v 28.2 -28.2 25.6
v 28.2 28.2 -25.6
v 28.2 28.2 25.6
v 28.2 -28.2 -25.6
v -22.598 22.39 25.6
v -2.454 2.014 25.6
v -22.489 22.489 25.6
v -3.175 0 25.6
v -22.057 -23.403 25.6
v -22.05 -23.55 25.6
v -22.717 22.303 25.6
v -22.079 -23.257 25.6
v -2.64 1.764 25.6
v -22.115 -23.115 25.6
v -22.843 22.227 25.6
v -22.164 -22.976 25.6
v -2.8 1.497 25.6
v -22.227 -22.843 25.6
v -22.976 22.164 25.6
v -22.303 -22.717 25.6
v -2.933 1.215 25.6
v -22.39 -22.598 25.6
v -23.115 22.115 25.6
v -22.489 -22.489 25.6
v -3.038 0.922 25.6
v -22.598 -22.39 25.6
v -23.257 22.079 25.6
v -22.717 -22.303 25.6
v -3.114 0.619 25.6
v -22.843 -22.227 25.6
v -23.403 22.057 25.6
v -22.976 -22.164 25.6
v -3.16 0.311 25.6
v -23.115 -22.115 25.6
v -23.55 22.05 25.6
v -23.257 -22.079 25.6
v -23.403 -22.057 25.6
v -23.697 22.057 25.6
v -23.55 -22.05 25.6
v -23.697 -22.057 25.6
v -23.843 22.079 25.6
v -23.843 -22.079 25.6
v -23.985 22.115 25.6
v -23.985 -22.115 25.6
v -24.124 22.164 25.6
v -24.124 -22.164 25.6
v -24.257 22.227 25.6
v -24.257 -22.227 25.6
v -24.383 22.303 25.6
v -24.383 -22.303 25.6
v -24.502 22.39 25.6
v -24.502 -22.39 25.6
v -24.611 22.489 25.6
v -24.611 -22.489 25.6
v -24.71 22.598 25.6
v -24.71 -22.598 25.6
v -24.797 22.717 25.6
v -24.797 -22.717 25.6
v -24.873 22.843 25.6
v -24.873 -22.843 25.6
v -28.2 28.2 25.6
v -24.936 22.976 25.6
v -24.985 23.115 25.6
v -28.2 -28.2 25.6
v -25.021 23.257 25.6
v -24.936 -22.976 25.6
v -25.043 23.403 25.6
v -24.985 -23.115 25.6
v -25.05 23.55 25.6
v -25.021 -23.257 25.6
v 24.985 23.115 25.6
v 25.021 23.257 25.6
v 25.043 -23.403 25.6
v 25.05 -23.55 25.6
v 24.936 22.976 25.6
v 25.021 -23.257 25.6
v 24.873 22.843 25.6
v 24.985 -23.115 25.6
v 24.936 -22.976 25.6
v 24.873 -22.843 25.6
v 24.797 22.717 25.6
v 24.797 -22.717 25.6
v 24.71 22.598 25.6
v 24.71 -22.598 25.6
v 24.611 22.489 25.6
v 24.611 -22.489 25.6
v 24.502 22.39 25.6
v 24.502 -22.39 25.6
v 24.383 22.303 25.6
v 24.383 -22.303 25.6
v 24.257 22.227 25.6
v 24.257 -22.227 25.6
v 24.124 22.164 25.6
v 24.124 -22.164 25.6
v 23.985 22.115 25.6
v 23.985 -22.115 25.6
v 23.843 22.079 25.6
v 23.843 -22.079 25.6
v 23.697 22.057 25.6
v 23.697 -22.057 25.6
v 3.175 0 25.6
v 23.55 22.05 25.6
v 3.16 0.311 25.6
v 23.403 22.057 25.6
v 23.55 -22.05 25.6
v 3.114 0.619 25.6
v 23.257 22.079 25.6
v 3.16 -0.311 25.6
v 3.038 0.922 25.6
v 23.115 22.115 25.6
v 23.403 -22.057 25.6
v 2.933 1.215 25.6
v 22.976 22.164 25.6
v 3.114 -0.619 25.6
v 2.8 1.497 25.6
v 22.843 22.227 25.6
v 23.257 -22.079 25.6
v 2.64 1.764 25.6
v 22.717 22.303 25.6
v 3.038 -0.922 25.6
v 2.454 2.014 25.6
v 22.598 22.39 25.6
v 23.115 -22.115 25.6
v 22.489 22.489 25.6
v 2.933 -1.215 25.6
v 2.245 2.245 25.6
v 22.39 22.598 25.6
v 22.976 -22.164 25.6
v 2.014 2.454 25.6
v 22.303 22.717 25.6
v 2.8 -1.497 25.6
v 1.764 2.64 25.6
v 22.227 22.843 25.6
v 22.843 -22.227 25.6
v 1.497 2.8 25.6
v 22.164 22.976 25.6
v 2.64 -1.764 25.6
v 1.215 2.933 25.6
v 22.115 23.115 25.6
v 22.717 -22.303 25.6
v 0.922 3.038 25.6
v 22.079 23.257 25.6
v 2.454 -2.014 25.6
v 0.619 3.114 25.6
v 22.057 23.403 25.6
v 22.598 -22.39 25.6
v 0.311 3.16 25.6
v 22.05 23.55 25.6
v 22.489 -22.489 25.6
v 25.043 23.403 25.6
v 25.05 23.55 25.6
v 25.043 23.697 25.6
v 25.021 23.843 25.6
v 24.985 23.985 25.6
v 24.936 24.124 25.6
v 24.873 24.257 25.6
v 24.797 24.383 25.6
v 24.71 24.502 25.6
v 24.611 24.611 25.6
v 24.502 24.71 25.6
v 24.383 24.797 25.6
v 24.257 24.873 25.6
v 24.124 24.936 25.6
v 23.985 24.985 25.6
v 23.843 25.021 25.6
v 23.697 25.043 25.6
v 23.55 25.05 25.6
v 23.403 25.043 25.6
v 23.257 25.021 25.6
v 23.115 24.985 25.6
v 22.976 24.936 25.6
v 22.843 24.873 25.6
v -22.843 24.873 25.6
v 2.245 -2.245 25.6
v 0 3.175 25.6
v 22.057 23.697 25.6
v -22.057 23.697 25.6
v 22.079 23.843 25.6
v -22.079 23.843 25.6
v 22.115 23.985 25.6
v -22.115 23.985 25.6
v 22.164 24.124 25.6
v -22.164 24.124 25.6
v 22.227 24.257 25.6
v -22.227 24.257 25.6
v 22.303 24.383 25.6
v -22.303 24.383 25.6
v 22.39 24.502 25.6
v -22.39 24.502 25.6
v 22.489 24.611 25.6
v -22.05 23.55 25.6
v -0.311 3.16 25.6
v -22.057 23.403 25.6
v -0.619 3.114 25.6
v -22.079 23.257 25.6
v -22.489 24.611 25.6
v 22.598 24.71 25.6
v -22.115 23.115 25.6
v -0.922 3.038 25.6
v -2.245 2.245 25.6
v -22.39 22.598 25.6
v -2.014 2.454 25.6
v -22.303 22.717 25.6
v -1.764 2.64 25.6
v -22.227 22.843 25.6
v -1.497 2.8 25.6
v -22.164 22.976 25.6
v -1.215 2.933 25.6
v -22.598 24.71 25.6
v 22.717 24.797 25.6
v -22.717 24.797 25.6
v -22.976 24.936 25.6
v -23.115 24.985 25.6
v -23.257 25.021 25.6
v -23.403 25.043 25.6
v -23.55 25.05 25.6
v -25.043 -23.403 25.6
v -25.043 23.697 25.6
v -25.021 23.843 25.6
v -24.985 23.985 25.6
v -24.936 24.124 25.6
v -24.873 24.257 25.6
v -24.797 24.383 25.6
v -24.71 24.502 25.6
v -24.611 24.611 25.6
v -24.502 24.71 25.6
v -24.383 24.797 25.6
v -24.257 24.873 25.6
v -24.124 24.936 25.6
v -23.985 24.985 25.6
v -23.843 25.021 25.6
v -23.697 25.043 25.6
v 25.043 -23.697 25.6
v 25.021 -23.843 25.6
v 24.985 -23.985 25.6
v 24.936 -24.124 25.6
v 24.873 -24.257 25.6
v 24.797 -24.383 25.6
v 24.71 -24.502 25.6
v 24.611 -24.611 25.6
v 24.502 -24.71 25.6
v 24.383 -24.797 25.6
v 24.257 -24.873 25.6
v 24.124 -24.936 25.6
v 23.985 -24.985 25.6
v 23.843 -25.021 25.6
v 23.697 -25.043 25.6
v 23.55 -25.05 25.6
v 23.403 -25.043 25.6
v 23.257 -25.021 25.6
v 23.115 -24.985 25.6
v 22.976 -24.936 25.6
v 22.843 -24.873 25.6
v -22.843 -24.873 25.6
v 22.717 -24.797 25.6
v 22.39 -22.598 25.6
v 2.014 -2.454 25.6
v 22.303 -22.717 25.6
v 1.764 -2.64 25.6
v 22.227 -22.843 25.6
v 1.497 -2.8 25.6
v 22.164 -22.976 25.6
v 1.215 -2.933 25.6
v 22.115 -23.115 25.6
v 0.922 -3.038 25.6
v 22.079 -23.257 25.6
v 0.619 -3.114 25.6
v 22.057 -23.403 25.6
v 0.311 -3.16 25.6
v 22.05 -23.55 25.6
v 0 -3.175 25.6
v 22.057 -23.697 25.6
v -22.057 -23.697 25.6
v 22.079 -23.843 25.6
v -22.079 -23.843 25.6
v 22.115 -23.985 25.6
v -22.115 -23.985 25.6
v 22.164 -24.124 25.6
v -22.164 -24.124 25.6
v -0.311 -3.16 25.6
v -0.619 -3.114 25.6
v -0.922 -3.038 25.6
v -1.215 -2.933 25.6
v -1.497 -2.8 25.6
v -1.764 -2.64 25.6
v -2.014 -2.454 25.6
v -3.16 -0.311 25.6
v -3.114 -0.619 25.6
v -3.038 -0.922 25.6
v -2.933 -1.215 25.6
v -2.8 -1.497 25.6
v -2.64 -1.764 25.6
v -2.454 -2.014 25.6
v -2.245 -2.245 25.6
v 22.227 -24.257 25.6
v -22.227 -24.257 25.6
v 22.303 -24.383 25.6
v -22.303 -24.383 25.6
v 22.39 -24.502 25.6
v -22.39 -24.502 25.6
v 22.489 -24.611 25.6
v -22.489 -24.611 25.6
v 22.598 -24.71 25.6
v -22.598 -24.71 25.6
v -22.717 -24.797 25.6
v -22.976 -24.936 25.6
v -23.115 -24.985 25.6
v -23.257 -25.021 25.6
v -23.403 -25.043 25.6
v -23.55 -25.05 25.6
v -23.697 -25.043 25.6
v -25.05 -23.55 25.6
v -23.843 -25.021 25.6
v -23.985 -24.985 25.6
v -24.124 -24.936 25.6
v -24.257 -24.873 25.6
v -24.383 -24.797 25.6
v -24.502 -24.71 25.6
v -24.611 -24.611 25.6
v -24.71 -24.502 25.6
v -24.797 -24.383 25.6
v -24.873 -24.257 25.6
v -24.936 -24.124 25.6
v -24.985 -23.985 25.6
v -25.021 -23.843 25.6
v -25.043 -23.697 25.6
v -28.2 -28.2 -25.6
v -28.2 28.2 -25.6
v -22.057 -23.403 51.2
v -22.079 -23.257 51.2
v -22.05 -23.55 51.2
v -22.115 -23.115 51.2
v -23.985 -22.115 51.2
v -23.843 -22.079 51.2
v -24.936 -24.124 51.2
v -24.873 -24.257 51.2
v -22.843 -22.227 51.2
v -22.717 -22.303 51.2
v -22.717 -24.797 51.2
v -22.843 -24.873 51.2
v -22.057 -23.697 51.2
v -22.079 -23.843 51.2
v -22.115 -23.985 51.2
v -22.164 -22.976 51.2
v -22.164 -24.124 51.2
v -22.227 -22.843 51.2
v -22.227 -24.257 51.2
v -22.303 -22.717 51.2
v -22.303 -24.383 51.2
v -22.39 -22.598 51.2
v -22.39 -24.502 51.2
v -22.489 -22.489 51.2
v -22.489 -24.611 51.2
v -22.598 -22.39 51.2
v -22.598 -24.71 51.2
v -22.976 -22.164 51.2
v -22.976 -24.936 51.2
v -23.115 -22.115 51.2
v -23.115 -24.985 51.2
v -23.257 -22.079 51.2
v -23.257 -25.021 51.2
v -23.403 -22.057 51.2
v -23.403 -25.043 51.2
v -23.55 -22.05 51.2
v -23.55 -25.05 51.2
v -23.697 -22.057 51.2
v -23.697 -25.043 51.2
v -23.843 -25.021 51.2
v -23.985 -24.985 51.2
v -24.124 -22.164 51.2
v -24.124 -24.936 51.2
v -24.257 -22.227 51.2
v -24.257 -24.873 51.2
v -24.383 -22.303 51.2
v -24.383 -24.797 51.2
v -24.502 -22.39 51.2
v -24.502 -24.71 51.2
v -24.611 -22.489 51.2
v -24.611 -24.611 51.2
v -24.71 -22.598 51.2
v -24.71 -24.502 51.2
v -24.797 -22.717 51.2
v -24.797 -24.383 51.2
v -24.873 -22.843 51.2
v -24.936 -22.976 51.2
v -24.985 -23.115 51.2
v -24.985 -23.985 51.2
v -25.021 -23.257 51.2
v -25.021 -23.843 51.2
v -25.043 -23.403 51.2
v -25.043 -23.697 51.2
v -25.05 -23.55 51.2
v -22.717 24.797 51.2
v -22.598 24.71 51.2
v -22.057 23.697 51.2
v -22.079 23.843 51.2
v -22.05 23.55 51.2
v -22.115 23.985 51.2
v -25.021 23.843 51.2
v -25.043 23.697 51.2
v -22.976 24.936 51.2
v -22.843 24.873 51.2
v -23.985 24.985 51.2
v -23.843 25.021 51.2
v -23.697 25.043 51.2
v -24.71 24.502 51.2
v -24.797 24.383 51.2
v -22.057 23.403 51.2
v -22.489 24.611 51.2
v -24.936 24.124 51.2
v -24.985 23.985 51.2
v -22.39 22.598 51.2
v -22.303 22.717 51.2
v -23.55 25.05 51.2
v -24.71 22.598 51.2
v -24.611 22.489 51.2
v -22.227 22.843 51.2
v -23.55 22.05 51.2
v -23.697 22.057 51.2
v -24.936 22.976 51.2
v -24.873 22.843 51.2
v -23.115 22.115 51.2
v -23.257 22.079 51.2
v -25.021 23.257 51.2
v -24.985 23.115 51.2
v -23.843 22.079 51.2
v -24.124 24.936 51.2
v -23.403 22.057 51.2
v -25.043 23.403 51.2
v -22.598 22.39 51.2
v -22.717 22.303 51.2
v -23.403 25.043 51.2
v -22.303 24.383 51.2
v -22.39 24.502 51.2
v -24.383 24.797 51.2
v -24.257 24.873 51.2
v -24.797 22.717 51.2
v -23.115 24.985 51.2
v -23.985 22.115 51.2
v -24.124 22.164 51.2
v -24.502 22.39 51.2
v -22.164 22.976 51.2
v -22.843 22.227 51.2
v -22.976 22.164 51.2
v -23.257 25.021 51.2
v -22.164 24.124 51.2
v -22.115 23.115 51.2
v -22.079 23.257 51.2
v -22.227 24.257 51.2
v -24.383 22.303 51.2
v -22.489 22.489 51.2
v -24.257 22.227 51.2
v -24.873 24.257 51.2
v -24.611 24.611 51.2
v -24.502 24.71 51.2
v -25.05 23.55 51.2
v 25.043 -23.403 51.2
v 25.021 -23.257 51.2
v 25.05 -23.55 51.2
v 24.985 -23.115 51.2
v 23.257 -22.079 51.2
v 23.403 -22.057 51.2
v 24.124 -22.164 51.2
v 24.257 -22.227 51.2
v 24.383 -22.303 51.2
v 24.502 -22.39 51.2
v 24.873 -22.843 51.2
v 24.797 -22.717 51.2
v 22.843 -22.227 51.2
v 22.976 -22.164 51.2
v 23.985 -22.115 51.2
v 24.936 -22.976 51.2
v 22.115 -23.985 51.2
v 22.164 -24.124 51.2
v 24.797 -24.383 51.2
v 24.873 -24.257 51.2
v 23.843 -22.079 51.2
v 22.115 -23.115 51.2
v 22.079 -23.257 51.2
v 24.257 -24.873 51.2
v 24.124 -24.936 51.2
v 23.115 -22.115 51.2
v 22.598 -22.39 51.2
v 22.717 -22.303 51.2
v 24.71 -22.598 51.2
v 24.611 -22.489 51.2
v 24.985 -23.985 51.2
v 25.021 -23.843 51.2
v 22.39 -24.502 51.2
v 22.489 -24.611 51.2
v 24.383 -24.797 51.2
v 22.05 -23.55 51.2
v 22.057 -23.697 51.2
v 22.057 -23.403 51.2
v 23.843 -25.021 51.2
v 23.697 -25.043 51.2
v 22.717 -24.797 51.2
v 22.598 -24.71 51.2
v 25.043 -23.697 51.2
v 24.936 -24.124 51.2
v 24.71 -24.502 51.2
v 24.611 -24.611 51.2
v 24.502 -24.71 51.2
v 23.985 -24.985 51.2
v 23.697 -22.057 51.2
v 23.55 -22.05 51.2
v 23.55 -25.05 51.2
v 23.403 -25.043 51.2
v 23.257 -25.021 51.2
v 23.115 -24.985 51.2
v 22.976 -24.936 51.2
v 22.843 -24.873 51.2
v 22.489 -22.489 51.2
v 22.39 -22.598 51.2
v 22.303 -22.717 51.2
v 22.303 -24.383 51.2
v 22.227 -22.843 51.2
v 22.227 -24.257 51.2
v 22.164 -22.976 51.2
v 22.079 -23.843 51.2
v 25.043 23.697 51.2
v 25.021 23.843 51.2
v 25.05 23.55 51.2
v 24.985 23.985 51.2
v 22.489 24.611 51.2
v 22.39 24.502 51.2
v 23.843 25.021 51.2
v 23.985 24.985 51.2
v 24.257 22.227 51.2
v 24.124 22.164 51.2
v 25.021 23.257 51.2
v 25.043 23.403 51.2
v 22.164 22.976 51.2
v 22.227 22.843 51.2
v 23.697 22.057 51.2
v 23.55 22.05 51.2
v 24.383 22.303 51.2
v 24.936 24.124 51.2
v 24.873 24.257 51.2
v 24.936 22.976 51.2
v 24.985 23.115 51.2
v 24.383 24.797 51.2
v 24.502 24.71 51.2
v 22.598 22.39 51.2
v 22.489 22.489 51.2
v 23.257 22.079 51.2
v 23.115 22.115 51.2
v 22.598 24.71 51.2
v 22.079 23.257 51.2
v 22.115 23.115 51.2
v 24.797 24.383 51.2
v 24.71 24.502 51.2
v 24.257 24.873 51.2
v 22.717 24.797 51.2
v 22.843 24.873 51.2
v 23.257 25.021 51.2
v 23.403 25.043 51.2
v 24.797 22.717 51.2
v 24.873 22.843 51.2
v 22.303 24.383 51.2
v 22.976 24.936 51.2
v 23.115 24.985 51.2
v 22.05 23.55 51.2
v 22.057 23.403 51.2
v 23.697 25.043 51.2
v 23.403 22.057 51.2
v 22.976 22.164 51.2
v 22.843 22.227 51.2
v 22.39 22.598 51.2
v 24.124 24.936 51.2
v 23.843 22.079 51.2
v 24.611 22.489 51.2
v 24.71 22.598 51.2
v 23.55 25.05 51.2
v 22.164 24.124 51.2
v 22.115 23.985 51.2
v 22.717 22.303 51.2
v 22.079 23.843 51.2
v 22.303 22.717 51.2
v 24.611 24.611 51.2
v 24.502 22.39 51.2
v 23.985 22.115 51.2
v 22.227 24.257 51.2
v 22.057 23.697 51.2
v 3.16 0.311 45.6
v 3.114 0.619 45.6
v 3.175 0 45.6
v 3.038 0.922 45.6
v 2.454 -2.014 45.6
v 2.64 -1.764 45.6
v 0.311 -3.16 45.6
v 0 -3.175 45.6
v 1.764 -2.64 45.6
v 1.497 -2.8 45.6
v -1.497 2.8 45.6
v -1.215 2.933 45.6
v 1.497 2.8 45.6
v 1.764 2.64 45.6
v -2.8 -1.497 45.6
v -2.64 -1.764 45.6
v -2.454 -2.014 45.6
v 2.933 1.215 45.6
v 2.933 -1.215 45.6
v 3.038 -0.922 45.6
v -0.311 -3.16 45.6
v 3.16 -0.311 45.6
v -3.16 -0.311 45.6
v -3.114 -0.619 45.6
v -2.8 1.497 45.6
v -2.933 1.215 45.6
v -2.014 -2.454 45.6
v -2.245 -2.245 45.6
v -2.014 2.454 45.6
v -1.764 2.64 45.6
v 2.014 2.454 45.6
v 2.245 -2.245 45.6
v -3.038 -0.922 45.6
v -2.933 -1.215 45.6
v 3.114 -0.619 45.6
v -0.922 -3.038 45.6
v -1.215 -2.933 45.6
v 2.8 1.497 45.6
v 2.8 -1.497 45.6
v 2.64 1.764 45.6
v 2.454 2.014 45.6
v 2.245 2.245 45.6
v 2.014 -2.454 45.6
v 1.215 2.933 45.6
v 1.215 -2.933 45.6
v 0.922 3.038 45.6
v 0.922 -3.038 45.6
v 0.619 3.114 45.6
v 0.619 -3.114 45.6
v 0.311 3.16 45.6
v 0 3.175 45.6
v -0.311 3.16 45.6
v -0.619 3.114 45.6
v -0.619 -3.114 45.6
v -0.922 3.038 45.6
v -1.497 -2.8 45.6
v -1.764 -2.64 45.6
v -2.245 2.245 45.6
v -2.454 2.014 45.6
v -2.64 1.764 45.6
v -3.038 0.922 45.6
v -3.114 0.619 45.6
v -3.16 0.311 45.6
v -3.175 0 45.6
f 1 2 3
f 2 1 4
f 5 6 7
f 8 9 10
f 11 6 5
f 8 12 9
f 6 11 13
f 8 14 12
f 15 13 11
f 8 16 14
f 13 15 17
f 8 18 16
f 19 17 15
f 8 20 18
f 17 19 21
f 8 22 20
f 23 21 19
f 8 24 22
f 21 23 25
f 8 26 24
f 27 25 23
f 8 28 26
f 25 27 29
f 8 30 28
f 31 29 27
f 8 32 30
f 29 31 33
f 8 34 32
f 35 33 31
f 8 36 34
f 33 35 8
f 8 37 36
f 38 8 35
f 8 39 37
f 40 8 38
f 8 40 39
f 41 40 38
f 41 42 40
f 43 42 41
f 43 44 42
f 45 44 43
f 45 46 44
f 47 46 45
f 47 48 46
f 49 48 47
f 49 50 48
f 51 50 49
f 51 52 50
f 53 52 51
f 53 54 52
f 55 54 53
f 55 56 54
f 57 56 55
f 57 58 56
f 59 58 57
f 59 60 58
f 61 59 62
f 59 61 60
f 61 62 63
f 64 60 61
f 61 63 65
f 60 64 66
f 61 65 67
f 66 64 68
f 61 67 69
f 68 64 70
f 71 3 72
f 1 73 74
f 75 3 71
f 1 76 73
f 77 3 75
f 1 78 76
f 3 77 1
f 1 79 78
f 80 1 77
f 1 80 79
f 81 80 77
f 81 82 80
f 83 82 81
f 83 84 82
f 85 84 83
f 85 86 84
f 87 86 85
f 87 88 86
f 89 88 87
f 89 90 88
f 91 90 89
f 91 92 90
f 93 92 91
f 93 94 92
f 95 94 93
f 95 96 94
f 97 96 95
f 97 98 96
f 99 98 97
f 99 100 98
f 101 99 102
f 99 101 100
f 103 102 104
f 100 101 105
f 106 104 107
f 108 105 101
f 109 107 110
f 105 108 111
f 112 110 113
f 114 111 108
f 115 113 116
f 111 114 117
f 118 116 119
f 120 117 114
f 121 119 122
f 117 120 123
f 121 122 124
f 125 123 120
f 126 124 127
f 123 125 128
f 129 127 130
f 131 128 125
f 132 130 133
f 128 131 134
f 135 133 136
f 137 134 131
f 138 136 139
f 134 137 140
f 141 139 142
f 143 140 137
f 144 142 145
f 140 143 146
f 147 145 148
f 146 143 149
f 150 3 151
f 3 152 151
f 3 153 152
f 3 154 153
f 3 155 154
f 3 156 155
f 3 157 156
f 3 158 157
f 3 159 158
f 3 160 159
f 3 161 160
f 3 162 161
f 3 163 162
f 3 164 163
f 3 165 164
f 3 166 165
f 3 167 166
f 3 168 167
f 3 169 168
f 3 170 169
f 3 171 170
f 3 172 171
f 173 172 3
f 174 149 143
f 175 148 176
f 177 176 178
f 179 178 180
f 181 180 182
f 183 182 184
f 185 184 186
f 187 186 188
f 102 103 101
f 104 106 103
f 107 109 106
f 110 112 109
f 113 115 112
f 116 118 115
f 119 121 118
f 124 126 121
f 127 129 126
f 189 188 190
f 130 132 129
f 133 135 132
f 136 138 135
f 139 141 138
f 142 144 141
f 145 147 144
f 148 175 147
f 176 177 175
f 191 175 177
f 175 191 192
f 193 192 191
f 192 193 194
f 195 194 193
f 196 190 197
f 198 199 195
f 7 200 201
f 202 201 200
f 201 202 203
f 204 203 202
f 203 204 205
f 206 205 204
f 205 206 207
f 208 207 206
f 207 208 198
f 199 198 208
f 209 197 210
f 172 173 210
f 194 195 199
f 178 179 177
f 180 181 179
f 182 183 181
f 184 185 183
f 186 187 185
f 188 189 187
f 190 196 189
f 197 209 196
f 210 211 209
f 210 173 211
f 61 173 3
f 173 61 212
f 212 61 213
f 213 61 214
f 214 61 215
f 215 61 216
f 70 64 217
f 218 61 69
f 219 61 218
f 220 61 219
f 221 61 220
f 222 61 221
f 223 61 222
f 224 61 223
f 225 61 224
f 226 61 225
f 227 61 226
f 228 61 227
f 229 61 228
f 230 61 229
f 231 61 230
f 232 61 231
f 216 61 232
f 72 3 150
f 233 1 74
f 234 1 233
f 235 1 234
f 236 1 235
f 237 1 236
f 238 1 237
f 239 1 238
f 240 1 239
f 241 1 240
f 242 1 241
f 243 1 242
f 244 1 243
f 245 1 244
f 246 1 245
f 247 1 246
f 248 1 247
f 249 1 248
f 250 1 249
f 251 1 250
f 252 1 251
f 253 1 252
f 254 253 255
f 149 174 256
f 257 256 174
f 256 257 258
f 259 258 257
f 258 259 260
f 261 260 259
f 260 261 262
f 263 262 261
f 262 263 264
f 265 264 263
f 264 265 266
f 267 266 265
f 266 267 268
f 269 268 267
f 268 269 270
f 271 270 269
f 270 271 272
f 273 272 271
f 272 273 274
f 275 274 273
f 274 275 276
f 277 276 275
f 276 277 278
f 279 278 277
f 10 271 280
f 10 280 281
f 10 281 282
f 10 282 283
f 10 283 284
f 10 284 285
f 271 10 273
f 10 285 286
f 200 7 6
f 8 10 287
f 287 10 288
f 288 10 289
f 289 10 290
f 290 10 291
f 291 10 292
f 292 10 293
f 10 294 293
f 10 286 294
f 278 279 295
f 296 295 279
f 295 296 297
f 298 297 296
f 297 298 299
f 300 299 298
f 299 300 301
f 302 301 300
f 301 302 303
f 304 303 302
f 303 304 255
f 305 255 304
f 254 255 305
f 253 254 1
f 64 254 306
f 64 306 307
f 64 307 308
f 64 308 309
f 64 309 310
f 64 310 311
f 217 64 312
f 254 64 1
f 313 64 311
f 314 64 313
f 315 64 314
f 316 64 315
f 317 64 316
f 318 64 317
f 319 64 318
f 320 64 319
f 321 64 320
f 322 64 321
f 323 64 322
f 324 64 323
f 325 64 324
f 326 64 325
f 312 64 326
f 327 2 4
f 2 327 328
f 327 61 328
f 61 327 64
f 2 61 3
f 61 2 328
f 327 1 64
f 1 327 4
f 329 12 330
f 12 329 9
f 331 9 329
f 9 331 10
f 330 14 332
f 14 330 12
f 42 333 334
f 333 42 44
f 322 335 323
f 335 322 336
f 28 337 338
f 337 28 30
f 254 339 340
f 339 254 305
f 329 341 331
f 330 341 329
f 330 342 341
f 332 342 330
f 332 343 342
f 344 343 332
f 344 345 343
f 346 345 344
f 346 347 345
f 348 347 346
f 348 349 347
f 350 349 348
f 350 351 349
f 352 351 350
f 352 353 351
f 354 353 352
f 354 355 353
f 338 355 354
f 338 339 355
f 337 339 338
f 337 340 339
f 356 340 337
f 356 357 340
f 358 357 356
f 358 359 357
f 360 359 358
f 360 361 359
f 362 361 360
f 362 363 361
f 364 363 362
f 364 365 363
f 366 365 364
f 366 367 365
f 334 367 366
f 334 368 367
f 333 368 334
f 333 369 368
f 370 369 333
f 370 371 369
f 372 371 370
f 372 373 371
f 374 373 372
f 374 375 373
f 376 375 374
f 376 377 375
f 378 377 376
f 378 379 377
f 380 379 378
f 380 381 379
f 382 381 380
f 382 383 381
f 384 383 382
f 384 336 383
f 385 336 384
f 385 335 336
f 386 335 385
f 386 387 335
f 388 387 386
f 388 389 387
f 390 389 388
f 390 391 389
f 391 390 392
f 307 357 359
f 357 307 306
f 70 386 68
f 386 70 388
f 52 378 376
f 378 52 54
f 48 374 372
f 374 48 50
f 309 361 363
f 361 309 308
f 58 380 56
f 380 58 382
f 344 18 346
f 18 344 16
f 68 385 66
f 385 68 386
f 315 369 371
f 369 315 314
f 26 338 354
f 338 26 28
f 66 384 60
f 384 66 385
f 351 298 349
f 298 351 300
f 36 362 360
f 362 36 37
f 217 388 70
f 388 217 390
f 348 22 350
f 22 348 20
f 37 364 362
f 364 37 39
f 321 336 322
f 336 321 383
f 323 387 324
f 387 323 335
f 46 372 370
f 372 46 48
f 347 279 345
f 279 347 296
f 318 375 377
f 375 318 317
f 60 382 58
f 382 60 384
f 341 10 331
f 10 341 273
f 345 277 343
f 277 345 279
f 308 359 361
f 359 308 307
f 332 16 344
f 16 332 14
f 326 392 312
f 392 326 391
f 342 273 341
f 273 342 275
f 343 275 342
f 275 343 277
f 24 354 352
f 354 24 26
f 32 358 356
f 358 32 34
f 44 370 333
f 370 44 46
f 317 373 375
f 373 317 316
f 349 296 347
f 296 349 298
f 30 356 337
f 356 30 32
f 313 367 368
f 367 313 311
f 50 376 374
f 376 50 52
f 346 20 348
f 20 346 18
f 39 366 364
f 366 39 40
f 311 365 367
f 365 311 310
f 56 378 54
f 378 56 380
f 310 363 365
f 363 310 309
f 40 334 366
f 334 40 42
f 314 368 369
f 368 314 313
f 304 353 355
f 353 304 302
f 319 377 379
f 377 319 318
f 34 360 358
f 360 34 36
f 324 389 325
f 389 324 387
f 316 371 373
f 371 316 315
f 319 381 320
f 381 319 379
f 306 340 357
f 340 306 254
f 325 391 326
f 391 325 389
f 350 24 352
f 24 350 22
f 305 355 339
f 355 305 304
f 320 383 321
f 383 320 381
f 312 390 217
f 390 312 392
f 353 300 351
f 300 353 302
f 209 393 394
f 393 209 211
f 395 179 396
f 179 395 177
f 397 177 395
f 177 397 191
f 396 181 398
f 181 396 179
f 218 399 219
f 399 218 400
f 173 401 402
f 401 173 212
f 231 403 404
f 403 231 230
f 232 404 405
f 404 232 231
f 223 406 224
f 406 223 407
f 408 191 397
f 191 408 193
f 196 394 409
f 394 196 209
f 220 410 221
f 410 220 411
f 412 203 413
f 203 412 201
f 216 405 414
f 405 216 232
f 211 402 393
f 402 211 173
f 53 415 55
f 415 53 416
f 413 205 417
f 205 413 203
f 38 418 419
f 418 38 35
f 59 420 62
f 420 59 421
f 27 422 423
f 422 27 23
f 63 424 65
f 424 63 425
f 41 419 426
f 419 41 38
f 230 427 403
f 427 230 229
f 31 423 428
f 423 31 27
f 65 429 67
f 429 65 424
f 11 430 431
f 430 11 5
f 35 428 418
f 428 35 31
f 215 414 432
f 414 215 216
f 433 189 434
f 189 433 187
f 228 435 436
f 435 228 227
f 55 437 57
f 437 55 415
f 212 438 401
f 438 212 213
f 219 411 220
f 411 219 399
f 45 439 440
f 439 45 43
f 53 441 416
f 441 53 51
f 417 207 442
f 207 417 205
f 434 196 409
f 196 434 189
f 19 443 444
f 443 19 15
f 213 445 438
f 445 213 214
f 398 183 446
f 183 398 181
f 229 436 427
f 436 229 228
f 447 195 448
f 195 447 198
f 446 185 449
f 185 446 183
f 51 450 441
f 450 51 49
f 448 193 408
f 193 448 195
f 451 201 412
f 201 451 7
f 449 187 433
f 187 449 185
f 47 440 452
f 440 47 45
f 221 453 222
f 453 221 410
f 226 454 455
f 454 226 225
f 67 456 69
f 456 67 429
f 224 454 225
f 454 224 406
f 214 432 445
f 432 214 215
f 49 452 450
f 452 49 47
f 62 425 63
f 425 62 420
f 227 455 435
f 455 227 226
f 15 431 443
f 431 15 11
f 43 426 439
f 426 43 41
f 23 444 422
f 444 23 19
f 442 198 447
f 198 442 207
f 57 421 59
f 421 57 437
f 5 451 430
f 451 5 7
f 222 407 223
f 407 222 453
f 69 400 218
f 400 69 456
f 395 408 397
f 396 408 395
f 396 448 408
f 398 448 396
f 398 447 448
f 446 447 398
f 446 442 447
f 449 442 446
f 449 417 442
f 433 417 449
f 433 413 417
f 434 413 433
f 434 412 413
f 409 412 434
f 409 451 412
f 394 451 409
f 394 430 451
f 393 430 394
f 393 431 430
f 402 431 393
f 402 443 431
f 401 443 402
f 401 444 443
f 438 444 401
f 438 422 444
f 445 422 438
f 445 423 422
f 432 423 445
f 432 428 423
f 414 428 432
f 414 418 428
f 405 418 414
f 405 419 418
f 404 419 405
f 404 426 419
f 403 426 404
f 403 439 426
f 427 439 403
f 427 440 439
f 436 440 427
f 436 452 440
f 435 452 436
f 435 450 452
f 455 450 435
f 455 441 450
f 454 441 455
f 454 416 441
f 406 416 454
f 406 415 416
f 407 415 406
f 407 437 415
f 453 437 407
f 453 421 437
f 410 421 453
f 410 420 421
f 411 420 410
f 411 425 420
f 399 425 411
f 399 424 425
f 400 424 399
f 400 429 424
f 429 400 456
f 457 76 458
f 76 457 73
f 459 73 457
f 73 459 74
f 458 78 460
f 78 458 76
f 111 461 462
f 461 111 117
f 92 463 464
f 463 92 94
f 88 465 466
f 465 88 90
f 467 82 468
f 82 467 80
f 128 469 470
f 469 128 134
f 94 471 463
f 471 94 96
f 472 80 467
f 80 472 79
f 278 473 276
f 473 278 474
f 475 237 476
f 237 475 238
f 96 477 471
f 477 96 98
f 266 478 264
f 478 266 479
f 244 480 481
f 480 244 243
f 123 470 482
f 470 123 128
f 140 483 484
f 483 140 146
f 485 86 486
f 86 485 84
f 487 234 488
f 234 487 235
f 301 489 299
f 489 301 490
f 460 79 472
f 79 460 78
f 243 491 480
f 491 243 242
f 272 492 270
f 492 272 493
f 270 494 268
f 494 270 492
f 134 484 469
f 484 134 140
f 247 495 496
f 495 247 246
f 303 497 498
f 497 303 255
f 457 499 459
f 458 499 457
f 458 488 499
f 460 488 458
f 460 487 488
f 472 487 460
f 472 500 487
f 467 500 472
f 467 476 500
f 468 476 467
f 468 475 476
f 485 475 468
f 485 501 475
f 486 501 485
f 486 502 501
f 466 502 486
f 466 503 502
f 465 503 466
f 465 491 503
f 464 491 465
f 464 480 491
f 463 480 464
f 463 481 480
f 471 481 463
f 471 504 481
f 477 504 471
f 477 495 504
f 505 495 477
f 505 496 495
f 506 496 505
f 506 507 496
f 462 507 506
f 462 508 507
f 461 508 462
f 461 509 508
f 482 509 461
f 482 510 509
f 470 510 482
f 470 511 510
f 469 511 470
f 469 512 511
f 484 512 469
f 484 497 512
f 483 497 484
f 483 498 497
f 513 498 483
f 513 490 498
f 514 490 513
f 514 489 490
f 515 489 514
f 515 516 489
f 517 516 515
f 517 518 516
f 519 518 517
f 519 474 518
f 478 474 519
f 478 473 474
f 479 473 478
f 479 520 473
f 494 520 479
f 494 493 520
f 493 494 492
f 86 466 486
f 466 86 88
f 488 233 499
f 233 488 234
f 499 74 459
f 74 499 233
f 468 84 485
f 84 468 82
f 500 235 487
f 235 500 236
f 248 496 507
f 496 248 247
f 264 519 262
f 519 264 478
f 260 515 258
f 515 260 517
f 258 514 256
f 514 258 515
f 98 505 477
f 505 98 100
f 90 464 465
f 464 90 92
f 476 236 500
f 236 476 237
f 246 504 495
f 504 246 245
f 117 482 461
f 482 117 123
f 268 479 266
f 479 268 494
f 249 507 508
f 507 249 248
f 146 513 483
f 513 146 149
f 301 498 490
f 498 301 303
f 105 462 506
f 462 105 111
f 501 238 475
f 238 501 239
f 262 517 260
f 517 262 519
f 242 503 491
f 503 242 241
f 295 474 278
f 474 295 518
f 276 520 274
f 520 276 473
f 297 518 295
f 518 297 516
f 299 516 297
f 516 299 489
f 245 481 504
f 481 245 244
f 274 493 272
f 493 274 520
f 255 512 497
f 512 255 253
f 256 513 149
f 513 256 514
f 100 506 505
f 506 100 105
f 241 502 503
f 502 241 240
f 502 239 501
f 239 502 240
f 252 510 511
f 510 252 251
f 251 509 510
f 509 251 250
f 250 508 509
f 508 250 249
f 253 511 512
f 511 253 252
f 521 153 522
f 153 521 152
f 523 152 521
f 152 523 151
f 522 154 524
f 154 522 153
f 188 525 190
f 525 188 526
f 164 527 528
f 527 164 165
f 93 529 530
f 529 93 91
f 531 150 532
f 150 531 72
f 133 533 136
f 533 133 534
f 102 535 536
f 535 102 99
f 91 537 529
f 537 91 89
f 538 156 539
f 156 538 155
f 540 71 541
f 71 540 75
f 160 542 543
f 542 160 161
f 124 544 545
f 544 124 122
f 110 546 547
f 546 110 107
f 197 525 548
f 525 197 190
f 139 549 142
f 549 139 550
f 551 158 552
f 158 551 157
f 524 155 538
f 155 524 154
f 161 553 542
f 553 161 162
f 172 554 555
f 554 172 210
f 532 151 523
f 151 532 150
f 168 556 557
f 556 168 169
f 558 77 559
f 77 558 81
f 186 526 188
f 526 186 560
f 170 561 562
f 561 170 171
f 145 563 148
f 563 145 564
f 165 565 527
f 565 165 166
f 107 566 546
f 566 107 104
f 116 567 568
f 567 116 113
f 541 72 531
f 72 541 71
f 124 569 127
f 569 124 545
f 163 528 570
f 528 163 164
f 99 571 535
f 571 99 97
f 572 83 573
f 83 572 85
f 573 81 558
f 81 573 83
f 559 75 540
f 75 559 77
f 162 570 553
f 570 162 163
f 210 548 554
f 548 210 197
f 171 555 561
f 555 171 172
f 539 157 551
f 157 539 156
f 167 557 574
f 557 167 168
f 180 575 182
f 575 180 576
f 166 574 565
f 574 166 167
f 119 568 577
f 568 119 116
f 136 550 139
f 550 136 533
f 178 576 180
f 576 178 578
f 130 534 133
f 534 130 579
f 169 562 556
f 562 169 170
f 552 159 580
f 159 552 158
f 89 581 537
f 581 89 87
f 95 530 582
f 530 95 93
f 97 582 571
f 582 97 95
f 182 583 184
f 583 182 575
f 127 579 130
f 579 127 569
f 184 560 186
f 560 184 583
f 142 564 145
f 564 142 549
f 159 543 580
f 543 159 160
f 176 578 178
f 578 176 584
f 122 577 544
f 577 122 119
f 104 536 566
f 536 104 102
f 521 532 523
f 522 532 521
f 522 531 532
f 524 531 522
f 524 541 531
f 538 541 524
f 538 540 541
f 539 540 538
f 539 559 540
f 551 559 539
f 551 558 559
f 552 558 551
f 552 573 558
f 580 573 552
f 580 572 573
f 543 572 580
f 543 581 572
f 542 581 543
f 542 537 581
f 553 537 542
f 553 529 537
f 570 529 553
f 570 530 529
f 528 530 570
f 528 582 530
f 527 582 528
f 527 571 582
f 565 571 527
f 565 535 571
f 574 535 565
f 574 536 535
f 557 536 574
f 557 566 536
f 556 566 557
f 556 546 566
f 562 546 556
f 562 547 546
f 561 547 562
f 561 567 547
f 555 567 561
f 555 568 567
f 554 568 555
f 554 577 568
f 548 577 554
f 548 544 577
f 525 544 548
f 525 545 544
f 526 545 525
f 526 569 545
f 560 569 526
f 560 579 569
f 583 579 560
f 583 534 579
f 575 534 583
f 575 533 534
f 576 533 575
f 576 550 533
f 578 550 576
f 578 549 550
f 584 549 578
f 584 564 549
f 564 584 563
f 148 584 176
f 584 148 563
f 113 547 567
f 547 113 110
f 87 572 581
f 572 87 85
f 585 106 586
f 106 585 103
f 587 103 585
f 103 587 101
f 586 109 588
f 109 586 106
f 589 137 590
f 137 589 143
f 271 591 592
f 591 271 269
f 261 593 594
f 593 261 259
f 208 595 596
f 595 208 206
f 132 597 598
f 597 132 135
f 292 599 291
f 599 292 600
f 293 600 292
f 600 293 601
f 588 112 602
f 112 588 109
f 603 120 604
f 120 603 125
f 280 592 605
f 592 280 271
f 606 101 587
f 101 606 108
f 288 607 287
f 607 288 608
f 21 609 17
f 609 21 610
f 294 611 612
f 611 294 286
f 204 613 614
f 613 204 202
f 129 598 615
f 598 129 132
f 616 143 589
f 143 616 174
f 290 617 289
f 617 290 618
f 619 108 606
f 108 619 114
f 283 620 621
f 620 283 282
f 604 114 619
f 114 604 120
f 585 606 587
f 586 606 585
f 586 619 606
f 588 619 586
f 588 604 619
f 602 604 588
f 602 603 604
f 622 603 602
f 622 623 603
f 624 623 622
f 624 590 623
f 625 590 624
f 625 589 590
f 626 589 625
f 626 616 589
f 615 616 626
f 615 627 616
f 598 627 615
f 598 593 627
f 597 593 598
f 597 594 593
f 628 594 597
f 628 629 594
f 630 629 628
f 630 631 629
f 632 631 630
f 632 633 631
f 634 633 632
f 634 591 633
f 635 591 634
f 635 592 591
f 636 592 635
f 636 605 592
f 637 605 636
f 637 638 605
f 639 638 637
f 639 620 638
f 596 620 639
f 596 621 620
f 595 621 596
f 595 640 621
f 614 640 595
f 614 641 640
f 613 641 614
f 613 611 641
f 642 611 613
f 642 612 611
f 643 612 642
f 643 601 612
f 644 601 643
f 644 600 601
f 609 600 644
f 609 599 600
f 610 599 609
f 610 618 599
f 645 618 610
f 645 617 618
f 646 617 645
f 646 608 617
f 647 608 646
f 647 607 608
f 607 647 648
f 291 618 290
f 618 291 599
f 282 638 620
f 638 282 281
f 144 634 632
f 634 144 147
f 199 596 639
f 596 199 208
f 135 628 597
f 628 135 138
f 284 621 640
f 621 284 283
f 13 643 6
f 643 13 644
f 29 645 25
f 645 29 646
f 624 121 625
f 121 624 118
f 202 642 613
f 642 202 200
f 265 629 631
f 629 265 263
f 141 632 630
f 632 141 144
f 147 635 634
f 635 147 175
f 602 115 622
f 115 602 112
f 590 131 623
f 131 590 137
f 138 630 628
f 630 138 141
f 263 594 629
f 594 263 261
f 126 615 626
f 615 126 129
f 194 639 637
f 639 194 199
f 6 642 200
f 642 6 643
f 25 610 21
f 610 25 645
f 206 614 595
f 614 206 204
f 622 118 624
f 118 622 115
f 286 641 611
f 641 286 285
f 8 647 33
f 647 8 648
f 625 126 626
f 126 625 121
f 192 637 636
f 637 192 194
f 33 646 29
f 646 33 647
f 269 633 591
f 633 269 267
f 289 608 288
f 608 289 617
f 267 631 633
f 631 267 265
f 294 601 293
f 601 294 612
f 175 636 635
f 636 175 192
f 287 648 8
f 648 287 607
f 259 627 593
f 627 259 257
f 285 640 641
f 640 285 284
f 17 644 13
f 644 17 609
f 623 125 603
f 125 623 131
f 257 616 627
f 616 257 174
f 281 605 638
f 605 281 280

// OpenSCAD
module stepper_motor() {
    // Motor body
    difference() {
        cube([56.4, 56.4, 51.2], center = true);
        // Shaft hole
        translate([0, 0, 25.6])
            cylinder(h = 51.2, d = 6.35, $fn = 64);
    }
    
    // Shaft
    translate([0, 0, 25.6])
        cylinder(h = 20, d = 6.35, $fn = 64);
    
    // Mounting holes
    for (x = [-23.55, 23.55])
        for (y = [-23.55, 23.55])
            translate([x, y, 0])
                cylinder(h = 51.2, d = 3, $fn = 64);
}

stepper_motor();
